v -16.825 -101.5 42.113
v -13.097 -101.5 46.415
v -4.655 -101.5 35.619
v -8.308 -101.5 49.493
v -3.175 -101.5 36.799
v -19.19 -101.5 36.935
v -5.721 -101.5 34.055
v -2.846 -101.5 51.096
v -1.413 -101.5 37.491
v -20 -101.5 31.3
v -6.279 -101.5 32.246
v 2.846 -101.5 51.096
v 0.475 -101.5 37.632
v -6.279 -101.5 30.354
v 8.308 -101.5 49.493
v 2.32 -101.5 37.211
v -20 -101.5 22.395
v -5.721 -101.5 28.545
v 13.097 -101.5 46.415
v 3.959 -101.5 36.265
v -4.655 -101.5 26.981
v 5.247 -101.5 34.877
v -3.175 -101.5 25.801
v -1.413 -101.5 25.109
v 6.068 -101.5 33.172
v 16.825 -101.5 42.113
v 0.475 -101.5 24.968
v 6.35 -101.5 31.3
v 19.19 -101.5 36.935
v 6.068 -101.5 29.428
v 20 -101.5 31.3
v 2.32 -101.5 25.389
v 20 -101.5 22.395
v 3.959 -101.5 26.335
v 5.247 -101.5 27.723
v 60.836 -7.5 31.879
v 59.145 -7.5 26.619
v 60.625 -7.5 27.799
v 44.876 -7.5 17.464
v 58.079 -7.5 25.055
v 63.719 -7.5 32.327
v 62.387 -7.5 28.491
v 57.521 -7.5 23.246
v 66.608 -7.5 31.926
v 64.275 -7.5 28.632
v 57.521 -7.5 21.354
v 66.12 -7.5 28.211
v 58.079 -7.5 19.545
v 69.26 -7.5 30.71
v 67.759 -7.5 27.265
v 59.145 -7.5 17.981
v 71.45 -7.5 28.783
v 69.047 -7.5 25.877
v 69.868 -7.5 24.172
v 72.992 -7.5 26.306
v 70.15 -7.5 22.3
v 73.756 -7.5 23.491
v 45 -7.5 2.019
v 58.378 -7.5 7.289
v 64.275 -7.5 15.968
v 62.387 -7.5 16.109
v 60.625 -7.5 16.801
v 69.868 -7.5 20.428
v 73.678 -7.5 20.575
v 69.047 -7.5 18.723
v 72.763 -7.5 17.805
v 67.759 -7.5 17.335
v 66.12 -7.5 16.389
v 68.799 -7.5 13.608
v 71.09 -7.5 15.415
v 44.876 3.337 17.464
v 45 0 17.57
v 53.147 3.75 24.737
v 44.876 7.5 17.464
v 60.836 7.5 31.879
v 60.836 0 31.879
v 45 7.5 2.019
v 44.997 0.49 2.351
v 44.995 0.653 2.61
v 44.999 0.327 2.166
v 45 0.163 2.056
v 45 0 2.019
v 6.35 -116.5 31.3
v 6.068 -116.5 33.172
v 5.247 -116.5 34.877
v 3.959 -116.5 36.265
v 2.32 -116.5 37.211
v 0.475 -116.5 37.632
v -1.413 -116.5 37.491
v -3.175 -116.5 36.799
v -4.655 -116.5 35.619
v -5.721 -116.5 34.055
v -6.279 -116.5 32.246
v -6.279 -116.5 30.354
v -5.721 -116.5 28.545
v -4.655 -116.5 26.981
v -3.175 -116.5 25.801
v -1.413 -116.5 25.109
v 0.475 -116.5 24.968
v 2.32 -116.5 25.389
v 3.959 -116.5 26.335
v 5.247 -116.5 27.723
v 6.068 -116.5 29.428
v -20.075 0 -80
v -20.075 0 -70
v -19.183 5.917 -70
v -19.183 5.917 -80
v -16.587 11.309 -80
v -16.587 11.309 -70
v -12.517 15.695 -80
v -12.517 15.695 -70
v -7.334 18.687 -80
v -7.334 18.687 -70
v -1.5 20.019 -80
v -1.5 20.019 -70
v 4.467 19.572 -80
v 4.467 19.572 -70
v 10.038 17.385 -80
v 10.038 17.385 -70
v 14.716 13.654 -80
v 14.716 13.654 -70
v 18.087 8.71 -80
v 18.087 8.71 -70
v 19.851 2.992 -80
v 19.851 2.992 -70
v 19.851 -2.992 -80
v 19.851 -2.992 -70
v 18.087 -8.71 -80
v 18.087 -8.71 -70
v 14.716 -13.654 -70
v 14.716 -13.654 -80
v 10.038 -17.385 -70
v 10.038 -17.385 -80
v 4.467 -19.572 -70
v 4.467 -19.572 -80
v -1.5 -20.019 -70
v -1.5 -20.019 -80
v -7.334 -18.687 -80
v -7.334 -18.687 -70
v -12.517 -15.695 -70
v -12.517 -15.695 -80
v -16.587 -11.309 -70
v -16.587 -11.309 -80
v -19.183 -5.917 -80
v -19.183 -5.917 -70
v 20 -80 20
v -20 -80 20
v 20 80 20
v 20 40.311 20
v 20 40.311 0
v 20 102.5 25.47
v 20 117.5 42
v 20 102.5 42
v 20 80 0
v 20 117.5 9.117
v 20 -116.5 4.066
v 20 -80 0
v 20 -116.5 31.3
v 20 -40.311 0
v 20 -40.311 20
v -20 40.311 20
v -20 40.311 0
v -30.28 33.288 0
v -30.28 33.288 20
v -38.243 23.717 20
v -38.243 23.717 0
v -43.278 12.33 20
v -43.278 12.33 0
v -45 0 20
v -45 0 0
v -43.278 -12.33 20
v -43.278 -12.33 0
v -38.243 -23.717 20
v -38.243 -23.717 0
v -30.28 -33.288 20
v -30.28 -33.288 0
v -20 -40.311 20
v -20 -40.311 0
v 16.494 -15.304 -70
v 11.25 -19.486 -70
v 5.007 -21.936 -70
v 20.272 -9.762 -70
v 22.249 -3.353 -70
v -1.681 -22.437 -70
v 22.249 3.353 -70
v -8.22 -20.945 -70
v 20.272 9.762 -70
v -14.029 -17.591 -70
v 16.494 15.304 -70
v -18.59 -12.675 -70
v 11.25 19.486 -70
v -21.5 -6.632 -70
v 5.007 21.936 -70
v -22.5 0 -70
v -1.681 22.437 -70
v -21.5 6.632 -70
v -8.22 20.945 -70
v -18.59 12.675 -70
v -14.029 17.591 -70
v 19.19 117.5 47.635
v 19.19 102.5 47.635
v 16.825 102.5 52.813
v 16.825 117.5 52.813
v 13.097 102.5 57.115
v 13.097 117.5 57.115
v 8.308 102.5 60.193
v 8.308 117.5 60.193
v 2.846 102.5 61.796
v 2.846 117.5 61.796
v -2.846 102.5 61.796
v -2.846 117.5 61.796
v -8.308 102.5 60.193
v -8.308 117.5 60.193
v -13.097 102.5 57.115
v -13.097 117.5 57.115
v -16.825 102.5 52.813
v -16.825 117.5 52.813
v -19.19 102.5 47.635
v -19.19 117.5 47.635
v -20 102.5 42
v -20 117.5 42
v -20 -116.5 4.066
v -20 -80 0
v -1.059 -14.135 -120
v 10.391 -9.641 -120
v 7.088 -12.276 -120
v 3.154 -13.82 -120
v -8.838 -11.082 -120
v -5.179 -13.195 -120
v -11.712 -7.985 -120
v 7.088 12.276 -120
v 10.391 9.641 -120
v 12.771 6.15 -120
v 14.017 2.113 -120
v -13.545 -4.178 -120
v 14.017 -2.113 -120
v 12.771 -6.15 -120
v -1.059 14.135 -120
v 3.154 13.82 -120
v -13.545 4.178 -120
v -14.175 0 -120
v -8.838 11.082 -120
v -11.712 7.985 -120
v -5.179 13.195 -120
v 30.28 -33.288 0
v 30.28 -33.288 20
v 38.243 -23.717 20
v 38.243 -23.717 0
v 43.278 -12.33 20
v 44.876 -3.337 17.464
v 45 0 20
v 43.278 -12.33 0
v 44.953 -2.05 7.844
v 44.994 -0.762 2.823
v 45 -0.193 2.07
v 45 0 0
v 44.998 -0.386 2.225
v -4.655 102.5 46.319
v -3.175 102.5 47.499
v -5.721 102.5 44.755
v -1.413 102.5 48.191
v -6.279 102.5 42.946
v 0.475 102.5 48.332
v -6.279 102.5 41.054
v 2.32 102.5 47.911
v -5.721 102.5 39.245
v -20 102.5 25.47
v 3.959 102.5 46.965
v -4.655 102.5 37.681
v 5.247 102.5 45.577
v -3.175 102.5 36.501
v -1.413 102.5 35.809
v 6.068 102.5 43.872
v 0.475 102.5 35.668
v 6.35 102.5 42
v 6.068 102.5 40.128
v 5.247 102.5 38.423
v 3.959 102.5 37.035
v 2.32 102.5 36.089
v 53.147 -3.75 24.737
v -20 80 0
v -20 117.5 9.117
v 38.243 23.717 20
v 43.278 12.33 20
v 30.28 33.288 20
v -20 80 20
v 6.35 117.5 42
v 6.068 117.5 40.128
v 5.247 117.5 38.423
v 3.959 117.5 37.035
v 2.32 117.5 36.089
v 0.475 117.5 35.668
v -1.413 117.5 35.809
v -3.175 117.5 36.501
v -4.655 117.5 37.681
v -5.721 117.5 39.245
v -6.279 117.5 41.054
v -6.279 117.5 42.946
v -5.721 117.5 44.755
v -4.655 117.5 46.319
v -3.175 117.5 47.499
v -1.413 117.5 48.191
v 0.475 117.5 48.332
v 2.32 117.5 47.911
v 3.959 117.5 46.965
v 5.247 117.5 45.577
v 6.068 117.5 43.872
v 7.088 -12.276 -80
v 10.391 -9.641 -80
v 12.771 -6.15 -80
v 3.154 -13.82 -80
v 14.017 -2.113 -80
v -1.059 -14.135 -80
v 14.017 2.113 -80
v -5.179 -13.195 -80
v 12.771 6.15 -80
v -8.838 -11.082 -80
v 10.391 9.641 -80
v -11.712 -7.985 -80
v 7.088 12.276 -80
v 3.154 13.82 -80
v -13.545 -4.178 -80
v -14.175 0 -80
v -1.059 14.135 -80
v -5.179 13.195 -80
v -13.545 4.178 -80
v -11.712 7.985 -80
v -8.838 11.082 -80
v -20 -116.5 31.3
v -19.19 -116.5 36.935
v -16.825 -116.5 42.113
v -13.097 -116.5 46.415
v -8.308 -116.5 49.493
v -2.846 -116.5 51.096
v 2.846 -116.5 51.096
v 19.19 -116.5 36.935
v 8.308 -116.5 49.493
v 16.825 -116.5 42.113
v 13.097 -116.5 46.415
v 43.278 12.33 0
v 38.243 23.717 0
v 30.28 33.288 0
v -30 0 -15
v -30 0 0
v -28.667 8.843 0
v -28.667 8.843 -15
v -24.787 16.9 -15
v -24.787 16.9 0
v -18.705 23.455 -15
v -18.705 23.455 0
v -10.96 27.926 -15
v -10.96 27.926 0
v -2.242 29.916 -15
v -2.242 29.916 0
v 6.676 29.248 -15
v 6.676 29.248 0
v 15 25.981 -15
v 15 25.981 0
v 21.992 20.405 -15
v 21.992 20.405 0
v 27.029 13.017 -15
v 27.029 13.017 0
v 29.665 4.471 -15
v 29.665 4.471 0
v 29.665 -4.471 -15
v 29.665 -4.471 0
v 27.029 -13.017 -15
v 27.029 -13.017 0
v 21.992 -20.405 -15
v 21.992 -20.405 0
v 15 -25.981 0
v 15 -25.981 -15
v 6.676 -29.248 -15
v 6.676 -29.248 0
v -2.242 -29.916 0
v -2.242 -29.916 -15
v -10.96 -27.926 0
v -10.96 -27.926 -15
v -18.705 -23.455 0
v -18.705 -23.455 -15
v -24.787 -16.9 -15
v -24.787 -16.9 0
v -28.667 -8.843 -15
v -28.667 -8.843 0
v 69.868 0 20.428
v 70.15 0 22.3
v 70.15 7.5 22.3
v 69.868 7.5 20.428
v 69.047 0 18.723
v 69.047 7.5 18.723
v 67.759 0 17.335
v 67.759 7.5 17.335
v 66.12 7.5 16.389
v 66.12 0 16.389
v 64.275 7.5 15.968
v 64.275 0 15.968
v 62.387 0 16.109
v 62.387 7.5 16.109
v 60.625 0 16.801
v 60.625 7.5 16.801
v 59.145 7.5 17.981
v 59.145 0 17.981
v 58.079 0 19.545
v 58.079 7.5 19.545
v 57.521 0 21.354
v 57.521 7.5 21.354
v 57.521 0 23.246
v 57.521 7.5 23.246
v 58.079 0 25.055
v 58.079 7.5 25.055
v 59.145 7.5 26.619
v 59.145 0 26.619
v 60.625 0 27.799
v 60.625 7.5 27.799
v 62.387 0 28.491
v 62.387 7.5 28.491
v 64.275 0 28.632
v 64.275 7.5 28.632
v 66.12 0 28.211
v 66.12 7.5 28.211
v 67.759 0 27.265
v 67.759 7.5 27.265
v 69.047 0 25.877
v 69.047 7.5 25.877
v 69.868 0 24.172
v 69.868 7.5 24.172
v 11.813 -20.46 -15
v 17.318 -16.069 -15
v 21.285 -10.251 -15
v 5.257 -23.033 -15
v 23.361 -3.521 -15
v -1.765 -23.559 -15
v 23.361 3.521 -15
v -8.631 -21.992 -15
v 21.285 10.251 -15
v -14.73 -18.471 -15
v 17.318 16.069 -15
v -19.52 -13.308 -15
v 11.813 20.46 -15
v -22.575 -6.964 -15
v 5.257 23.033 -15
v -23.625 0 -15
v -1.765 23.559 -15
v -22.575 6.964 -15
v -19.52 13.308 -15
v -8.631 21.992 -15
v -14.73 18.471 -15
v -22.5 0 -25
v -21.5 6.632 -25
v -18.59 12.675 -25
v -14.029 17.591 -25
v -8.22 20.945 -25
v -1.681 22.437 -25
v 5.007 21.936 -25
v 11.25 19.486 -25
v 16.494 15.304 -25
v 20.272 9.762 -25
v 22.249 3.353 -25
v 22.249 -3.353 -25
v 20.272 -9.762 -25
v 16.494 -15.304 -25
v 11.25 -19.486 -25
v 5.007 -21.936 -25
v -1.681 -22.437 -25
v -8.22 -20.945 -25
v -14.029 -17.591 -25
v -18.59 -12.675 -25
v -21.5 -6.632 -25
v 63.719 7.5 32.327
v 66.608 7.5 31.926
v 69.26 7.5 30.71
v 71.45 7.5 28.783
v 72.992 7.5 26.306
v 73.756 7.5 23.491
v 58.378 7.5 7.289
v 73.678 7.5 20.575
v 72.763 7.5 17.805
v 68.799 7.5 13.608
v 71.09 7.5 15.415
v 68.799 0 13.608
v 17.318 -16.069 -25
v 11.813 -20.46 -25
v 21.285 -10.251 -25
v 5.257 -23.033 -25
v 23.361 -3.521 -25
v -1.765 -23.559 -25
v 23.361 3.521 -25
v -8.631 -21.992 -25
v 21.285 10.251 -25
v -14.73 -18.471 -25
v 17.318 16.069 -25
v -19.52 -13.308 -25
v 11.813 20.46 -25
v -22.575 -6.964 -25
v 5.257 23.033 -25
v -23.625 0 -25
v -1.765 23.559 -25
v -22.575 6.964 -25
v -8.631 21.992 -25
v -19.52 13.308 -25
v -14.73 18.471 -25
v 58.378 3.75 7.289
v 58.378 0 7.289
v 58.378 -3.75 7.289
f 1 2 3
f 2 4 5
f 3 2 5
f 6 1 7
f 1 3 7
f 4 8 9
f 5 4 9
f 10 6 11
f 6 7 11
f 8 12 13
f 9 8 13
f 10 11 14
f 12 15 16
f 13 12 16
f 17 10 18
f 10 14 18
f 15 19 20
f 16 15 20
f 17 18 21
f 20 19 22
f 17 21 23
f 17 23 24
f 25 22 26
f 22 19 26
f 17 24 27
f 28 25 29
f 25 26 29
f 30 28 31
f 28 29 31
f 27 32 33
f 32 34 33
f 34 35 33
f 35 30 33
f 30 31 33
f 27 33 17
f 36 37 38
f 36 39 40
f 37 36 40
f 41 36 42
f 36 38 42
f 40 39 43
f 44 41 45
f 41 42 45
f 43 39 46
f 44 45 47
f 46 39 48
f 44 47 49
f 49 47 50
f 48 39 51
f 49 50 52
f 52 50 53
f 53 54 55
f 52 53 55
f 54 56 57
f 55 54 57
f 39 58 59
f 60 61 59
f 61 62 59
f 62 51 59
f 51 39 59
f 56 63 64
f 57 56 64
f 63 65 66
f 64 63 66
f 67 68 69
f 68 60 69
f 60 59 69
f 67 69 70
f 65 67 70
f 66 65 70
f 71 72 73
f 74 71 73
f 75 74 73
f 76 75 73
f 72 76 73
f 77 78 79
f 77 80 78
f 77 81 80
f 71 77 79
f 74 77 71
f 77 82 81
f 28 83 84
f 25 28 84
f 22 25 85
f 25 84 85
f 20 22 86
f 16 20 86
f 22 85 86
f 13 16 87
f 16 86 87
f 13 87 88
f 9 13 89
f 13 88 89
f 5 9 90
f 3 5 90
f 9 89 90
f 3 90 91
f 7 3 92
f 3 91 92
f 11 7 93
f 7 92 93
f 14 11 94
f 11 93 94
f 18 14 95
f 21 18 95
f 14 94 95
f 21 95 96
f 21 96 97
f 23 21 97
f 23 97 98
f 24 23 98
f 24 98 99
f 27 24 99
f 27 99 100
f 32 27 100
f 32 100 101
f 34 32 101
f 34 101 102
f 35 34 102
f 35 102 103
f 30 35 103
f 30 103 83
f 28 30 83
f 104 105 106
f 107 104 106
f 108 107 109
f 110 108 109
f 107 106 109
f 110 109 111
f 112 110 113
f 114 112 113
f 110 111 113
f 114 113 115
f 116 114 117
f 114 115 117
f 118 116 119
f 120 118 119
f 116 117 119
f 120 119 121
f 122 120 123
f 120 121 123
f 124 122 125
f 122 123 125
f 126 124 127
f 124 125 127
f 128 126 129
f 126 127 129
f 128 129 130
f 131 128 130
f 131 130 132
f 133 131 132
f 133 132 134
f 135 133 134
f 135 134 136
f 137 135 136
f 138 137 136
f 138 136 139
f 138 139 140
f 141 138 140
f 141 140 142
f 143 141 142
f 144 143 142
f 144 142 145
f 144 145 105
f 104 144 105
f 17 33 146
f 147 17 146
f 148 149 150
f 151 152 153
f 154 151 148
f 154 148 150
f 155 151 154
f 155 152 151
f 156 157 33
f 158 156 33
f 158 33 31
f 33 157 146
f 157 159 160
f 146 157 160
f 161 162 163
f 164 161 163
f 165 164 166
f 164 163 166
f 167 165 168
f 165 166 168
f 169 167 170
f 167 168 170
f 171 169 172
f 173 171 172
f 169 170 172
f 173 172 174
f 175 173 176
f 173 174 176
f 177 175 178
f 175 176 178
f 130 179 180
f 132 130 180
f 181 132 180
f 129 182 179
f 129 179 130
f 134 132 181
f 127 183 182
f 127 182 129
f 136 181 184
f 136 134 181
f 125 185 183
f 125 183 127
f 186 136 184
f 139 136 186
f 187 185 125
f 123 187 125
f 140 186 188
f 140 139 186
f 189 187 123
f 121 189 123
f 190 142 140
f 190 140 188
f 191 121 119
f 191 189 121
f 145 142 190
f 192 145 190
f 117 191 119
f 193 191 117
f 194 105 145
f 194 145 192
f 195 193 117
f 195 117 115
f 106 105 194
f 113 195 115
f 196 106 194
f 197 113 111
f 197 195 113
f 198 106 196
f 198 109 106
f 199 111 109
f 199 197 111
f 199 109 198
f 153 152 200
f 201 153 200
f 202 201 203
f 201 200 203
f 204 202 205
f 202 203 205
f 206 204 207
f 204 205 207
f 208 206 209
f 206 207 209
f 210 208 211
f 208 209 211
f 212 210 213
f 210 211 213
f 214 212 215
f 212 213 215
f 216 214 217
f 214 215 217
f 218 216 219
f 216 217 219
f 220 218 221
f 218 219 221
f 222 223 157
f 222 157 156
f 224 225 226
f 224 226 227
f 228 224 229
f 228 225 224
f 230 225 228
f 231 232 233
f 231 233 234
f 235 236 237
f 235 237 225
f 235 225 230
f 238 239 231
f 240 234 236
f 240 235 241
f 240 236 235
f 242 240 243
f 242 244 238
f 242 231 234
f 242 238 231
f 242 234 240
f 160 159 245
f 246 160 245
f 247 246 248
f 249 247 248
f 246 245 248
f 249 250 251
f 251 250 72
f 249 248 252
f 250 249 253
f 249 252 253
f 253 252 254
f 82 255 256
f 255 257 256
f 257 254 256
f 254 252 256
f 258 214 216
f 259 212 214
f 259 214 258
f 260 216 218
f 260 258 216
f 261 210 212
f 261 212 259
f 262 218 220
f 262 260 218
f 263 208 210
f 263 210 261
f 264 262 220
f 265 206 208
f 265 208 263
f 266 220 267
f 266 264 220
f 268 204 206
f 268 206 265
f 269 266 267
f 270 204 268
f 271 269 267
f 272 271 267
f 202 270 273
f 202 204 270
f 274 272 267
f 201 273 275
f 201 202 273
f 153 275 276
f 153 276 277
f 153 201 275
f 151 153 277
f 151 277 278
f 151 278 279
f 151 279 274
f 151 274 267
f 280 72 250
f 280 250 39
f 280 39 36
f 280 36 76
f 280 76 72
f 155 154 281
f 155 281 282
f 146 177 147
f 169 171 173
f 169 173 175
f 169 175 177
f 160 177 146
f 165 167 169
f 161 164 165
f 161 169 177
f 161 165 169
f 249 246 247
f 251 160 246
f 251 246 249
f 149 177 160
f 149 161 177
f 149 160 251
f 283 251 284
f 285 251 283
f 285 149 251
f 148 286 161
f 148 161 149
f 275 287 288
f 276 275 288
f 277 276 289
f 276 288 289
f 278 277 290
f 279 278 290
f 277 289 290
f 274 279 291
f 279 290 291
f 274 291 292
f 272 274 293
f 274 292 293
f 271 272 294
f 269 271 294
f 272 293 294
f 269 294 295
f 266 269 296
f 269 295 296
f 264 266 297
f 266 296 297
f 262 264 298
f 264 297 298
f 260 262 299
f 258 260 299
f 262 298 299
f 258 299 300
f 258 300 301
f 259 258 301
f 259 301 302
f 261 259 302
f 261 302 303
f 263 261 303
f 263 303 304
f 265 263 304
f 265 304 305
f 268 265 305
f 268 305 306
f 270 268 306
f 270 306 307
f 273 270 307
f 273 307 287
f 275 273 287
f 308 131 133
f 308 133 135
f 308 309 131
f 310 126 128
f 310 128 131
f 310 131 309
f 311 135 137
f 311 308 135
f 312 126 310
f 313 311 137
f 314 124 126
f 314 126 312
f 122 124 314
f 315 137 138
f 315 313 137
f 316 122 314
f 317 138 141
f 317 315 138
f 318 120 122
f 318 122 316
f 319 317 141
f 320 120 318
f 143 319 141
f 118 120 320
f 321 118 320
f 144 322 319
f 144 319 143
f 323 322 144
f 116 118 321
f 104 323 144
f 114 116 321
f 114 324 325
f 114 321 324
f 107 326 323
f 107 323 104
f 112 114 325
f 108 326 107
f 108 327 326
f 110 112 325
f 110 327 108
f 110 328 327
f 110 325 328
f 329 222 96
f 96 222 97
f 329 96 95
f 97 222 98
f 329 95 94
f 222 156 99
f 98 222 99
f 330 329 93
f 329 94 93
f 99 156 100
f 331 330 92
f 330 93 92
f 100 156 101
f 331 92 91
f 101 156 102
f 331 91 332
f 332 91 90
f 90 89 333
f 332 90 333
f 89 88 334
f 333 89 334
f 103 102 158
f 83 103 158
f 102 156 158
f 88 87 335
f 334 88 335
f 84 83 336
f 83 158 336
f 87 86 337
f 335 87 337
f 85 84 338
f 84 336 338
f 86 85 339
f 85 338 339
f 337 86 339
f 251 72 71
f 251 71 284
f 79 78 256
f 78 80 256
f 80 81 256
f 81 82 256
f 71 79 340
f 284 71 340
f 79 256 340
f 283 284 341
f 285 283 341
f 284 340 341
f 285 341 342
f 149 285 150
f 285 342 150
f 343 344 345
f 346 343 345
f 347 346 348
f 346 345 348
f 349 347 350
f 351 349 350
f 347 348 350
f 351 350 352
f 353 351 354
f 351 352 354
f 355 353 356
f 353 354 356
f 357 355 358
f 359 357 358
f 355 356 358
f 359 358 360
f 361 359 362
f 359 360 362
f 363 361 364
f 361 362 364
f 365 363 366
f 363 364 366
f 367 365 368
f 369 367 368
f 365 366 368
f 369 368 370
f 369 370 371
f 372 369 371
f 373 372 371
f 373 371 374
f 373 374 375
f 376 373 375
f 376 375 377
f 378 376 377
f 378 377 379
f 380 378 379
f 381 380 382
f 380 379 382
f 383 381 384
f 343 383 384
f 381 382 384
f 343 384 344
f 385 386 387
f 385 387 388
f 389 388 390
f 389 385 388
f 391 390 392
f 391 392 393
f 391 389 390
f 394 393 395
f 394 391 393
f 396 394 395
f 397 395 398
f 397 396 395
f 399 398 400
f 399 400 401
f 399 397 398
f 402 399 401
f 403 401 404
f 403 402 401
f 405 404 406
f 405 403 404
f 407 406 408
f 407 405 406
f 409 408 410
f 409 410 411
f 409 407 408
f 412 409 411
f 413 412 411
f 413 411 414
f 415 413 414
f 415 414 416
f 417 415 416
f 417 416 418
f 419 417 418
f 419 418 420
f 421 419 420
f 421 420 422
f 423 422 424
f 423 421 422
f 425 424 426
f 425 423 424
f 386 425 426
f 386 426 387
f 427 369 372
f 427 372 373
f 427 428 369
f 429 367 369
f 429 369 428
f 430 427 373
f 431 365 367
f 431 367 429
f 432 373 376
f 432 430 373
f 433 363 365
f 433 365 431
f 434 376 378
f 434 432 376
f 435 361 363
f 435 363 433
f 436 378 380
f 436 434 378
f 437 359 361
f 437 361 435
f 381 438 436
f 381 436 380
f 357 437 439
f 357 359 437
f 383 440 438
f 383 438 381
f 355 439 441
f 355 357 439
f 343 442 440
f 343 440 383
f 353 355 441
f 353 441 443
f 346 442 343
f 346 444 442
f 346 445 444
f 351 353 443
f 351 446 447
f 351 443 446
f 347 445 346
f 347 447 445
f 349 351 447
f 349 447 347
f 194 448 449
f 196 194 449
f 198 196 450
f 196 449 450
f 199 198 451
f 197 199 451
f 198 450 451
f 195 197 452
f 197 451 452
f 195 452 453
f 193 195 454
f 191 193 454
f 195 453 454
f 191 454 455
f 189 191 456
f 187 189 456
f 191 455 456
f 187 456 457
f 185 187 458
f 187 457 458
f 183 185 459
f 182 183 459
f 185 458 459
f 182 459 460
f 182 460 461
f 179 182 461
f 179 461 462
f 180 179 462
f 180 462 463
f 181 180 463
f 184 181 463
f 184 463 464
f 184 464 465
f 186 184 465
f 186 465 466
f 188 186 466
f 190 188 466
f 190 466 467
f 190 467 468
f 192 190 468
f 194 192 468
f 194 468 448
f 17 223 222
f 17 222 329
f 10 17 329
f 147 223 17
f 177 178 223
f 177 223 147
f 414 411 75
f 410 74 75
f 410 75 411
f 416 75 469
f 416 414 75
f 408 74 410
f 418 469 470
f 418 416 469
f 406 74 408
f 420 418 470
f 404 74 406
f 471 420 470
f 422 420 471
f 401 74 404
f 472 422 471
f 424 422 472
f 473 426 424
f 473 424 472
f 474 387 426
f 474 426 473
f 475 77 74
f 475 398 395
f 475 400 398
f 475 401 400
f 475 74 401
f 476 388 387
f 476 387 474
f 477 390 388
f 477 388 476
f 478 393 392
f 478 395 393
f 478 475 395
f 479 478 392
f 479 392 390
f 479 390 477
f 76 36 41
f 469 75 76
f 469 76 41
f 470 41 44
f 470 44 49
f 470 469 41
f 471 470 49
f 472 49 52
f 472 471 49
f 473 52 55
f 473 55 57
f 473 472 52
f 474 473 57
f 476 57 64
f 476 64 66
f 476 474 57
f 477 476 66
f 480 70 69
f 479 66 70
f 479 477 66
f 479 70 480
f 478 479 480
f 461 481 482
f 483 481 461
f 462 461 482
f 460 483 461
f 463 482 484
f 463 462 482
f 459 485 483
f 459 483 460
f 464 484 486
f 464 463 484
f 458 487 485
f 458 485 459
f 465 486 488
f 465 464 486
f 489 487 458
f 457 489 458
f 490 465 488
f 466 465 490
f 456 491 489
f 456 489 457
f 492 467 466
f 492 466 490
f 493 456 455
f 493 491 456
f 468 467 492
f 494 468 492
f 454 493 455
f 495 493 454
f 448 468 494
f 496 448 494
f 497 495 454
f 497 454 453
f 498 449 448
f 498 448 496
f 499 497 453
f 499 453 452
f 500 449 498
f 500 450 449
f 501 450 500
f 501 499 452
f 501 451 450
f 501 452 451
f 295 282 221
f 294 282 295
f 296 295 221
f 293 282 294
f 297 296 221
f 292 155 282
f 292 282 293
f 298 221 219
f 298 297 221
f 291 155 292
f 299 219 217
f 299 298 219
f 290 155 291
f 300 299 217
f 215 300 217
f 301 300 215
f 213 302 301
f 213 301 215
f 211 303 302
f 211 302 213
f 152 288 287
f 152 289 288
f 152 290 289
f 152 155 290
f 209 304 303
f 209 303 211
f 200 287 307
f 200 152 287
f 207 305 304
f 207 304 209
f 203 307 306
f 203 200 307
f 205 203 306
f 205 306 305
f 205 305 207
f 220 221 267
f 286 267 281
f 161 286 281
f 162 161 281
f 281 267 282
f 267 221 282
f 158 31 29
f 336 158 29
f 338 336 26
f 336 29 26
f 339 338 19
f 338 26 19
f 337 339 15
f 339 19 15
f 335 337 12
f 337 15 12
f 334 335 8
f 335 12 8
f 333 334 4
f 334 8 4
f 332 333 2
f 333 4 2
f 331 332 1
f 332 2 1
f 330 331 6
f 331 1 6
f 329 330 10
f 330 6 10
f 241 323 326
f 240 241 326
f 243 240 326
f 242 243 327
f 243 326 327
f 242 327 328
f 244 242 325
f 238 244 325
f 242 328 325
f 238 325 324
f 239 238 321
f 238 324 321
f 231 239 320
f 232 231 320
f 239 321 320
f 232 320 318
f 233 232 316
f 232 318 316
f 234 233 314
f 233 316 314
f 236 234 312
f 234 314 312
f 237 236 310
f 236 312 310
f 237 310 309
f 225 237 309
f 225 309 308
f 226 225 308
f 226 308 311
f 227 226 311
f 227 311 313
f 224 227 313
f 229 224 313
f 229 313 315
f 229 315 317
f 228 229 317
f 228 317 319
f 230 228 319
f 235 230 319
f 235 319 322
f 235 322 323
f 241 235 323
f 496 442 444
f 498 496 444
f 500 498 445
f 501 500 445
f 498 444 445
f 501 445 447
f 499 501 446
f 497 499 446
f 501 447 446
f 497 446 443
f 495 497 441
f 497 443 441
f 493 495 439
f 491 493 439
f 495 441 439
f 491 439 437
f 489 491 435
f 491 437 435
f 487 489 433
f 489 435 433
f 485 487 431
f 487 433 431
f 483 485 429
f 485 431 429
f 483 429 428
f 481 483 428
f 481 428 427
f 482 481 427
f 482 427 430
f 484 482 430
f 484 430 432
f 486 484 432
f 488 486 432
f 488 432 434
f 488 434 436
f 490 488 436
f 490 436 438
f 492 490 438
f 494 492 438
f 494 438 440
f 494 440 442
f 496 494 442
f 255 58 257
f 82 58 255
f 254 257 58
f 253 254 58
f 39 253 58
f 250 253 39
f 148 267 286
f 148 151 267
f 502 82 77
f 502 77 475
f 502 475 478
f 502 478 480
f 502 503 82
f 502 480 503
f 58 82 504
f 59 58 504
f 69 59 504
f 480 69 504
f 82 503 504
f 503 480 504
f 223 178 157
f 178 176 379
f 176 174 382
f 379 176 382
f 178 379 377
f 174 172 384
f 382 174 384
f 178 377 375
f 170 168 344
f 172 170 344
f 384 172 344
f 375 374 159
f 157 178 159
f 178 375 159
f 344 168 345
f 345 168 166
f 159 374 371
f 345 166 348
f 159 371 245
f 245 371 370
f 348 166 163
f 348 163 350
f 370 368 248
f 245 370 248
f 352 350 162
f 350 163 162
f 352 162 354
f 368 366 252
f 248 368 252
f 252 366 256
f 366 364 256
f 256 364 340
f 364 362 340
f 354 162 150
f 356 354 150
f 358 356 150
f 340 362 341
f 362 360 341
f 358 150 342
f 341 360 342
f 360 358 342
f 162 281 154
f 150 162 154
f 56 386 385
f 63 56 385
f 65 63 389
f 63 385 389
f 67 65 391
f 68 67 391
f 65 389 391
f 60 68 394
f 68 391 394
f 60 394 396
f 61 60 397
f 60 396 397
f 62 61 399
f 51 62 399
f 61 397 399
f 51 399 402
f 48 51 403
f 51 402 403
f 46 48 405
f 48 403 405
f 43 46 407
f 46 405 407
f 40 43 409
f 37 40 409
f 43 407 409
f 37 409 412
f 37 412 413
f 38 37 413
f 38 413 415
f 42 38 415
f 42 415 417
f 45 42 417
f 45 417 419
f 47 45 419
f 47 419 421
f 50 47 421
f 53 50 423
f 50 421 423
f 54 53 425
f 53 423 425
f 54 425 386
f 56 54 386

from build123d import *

# Parameters (mm, degrees)
BOSS_EXTRUDE1_DEPTH = 20
BOSS_EXTRUDE2_DEPTH = 20
CUT_EXTRUDE1_DEPTH  = 40
SKETCH3_R           = 6.35
CUT_EXTRUDE2_DEPTH  = 40
BOSS_EXTRUDE3_DEPTH = 20
SKETCH6_R           = 6.35
CUT_EXTRUDE4_DEPTH  = 40
SKETCH9_R           = 30
SKETCH9_R_2         = 23.625
BOSS_EXTRUDE4_DEPTH = 15
SKETCH9_3_R         = 23.625
SKETCH9_3_R_2       = 22.5
BOSS_EXTRUDE5_DEPTH = 25
SKETCH9_4_R         = 22.5
SKETCH9_4_R_2       = 20.075
BOSS_EXTRUDE6_DEPTH = 70
SKETCH9_5_R         = 20.075
SKETCH9_5_R_2       = 14.175
BOSS_EXTRUDE7_DEPTH = 80
SKETCH9_6_R         = 14.175
BOSS_EXTRUDE8_DEPTH = 120
CUT_EXTRUDE5_DEPTH  = 120
SKETCH12_R          = 6.35
BOSS_EXTRUDE9_DEPTH = 7.5


with BuildPart() as part:
    # Sketch1 → Boss-Extrude1 (new body)
    with BuildSketch(Plane.XY):
        with BuildLine():
            Line((20, 80), (-20, 80))
            Line((-20, 80), (-20, 40.311288741))
            ThreePointArc((-20, 40.311288741), (-45, 0), (-20, -40.311288741))
            Line((-20, -40.311288741), (-20, -80))
            Line((-20, -80), (20, -80))
            Line((20, -80), (20, -40.311288741))
            ThreePointArc((20, -40.311288741), (45, 0), (20, 40.311288741))
            Line((20, 40.311288741), (20, 80))
        make_face()
    extrude(amount=BOSS_EXTRUDE1_DEPTH)

    # Sketch2 → Boss-Extrude2 (add, symmetric)
    with BuildSketch(Plane(origin=(0, 0, 0), x_dir=(0, 0, -1), z_dir=(1, 0, 0))):
        Polygon((-20, 80), (0, 80), (-9.116936514, 117.5), (-63.916468616, 117.5), (-63.916468616, 102.5), (-25.470161908, 102.5), align=None)
    extrude(amount=BOSS_EXTRUDE2_DEPTH, both=True)

    # Sketch4 → Cut-Extrude1 (cut)
    with BuildSketch(Plane(origin=(0, 117.5, 0), x_dir=(1, 0, 0), z_dir=(0, 1, 0))):
        with BuildLine():
            Line((-20, -42), (-20, -63.916468616))
            Line((-20, -63.916468616), (20, -63.916468616))
            Line((20, -63.916468616), (20, -42))
            ThreePointArc((20, -42), (0, -62), (-20, -42))
        make_face()
    extrude(amount=-CUT_EXTRUDE1_DEPTH, mode=Mode.SUBTRACT)

    # Sketch3 → Cut-Extrude2 (cut)
    with BuildSketch(Plane(origin=(0, 117.5, 0), x_dir=(1, 0, 0), z_dir=(0, 1, 0))):
        with Locations((0, -42)):
            Circle(SKETCH3_R)
    extrude(amount=-CUT_EXTRUDE2_DEPTH, mode=Mode.SUBTRACT)

    # Sketch5 → Boss-Extrude3 (add, symmetric)
    with BuildSketch(Plane(origin=(0, 0, 0), x_dir=(0, 0, -1), z_dir=(1, 0, 0))):
        Polygon((-20, -80), (0, -80), (-4.065810475, -116.5), (-57.146175878, -116.5), (-57.146175878, -101.5), (-22.394929458, -101.5), align=None)
    extrude(amount=BOSS_EXTRUDE3_DEPTH, both=True)

    # Sketch6 → Cut-Extrude4 (cut)
    with BuildSketch(Plane.XZ.offset(116.5)):
        with Locations((0, 31.3)):
            Circle(SKETCH6_R)
    extrude(amount=-CUT_EXTRUDE4_DEPTH, mode=Mode.SUBTRACT)

    # Sketch9 → Boss-Extrude4 (add)
    with BuildSketch(Plane(origin=(0, 0, 0), x_dir=(-1, 0, 0), z_dir=(0, 0, -1))):
        Circle(SKETCH9_R)
        Circle(SKETCH9_R_2, mode=Mode.SUBTRACT)
    extrude(amount=BOSS_EXTRUDE4_DEPTH)

    # Sketch9<3> → Boss-Extrude5 (add)
    with BuildSketch(Plane(origin=(0, 0, 0), x_dir=(-1, 0, 0), z_dir=(0, 0, -1))):
        Circle(SKETCH9_3_R)
        Circle(SKETCH9_3_R_2, mode=Mode.SUBTRACT)
    extrude(amount=BOSS_EXTRUDE5_DEPTH)

    # Sketch9<4> → Boss-Extrude6 (add)
    with BuildSketch(Plane(origin=(0, 0, 0), x_dir=(-1, 0, 0), z_dir=(0, 0, -1))):
        Circle(SKETCH9_4_R)
        Circle(SKETCH9_4_R_2, mode=Mode.SUBTRACT)
    extrude(amount=BOSS_EXTRUDE6_DEPTH)

    # Sketch9<5> → Boss-Extrude7 (add)
    with BuildSketch(Plane(origin=(0, 0, 0), x_dir=(-1, 0, 0), z_dir=(0, 0, -1))):
        Circle(SKETCH9_5_R)
        Circle(SKETCH9_5_R_2, mode=Mode.SUBTRACT)
    extrude(amount=BOSS_EXTRUDE7_DEPTH)

    # Sketch9<6> → Boss-Extrude8 (add)
    with BuildSketch(Plane(origin=(0, 0, 0), x_dir=(-1, 0, 0), z_dir=(0, 0, -1))):
        Circle(SKETCH9_6_R)
    extrude(amount=BOSS_EXTRUDE8_DEPTH)

    # Sketch10 → Cut-Extrude5 (cut)
    with BuildSketch(Plane(origin=(0, -101.5, 0), x_dir=(1, 0, 0), z_dir=(0, 1, 0))):
        with BuildLine():
            Line((-20, -31.3), (-20, -57.146175878))
            Line((-20, -57.146175878), (20, -57.146175878))
            Line((20, -57.146175878), (20, -31.3))
            ThreePointArc((20, -31.3), (0, -51.3), (-20, -31.3))
        make_face()
    extrude(amount=-CUT_EXTRUDE5_DEPTH, mode=Mode.SUBTRACT)

    # Sketch12 → Boss-Extrude9 (add, symmetric)
    with BuildSketch(Plane(origin=(0, 0, 0), x_dir=(1, 0, 0), z_dir=(0, 1, 0))):
        with BuildLine():
            Line((45, -2.018705138), (44.876123934, -17.463703547))
            add(Edge.make_bspline(
                [(44.876123934, -17.463703547), (53.437219623, -24.801983569), (60.835955623, -31.879035395)],
                knots=[0, 0, 0, 1, 1, 1], degree=2))
            ThreePointArc((60.835955623, -31.879035395), (72.992020693, -26.306274296), (68.799253388, -13.607995414))
            add(Edge.make_bspline(
                [(45, -2.018705138), (59.856089875, -6.764812241), (68.799253388, -13.607995414)],
                knots=[0, 0, 0, 1, 1, 1], degree=2))
        make_face()
        with Locations((63.8, -22.3)):
            Circle(SKETCH12_R, mode=Mode.SUBTRACT)
    extrude(amount=BOSS_EXTRUDE9_DEPTH, both=True)


solid = part.part
